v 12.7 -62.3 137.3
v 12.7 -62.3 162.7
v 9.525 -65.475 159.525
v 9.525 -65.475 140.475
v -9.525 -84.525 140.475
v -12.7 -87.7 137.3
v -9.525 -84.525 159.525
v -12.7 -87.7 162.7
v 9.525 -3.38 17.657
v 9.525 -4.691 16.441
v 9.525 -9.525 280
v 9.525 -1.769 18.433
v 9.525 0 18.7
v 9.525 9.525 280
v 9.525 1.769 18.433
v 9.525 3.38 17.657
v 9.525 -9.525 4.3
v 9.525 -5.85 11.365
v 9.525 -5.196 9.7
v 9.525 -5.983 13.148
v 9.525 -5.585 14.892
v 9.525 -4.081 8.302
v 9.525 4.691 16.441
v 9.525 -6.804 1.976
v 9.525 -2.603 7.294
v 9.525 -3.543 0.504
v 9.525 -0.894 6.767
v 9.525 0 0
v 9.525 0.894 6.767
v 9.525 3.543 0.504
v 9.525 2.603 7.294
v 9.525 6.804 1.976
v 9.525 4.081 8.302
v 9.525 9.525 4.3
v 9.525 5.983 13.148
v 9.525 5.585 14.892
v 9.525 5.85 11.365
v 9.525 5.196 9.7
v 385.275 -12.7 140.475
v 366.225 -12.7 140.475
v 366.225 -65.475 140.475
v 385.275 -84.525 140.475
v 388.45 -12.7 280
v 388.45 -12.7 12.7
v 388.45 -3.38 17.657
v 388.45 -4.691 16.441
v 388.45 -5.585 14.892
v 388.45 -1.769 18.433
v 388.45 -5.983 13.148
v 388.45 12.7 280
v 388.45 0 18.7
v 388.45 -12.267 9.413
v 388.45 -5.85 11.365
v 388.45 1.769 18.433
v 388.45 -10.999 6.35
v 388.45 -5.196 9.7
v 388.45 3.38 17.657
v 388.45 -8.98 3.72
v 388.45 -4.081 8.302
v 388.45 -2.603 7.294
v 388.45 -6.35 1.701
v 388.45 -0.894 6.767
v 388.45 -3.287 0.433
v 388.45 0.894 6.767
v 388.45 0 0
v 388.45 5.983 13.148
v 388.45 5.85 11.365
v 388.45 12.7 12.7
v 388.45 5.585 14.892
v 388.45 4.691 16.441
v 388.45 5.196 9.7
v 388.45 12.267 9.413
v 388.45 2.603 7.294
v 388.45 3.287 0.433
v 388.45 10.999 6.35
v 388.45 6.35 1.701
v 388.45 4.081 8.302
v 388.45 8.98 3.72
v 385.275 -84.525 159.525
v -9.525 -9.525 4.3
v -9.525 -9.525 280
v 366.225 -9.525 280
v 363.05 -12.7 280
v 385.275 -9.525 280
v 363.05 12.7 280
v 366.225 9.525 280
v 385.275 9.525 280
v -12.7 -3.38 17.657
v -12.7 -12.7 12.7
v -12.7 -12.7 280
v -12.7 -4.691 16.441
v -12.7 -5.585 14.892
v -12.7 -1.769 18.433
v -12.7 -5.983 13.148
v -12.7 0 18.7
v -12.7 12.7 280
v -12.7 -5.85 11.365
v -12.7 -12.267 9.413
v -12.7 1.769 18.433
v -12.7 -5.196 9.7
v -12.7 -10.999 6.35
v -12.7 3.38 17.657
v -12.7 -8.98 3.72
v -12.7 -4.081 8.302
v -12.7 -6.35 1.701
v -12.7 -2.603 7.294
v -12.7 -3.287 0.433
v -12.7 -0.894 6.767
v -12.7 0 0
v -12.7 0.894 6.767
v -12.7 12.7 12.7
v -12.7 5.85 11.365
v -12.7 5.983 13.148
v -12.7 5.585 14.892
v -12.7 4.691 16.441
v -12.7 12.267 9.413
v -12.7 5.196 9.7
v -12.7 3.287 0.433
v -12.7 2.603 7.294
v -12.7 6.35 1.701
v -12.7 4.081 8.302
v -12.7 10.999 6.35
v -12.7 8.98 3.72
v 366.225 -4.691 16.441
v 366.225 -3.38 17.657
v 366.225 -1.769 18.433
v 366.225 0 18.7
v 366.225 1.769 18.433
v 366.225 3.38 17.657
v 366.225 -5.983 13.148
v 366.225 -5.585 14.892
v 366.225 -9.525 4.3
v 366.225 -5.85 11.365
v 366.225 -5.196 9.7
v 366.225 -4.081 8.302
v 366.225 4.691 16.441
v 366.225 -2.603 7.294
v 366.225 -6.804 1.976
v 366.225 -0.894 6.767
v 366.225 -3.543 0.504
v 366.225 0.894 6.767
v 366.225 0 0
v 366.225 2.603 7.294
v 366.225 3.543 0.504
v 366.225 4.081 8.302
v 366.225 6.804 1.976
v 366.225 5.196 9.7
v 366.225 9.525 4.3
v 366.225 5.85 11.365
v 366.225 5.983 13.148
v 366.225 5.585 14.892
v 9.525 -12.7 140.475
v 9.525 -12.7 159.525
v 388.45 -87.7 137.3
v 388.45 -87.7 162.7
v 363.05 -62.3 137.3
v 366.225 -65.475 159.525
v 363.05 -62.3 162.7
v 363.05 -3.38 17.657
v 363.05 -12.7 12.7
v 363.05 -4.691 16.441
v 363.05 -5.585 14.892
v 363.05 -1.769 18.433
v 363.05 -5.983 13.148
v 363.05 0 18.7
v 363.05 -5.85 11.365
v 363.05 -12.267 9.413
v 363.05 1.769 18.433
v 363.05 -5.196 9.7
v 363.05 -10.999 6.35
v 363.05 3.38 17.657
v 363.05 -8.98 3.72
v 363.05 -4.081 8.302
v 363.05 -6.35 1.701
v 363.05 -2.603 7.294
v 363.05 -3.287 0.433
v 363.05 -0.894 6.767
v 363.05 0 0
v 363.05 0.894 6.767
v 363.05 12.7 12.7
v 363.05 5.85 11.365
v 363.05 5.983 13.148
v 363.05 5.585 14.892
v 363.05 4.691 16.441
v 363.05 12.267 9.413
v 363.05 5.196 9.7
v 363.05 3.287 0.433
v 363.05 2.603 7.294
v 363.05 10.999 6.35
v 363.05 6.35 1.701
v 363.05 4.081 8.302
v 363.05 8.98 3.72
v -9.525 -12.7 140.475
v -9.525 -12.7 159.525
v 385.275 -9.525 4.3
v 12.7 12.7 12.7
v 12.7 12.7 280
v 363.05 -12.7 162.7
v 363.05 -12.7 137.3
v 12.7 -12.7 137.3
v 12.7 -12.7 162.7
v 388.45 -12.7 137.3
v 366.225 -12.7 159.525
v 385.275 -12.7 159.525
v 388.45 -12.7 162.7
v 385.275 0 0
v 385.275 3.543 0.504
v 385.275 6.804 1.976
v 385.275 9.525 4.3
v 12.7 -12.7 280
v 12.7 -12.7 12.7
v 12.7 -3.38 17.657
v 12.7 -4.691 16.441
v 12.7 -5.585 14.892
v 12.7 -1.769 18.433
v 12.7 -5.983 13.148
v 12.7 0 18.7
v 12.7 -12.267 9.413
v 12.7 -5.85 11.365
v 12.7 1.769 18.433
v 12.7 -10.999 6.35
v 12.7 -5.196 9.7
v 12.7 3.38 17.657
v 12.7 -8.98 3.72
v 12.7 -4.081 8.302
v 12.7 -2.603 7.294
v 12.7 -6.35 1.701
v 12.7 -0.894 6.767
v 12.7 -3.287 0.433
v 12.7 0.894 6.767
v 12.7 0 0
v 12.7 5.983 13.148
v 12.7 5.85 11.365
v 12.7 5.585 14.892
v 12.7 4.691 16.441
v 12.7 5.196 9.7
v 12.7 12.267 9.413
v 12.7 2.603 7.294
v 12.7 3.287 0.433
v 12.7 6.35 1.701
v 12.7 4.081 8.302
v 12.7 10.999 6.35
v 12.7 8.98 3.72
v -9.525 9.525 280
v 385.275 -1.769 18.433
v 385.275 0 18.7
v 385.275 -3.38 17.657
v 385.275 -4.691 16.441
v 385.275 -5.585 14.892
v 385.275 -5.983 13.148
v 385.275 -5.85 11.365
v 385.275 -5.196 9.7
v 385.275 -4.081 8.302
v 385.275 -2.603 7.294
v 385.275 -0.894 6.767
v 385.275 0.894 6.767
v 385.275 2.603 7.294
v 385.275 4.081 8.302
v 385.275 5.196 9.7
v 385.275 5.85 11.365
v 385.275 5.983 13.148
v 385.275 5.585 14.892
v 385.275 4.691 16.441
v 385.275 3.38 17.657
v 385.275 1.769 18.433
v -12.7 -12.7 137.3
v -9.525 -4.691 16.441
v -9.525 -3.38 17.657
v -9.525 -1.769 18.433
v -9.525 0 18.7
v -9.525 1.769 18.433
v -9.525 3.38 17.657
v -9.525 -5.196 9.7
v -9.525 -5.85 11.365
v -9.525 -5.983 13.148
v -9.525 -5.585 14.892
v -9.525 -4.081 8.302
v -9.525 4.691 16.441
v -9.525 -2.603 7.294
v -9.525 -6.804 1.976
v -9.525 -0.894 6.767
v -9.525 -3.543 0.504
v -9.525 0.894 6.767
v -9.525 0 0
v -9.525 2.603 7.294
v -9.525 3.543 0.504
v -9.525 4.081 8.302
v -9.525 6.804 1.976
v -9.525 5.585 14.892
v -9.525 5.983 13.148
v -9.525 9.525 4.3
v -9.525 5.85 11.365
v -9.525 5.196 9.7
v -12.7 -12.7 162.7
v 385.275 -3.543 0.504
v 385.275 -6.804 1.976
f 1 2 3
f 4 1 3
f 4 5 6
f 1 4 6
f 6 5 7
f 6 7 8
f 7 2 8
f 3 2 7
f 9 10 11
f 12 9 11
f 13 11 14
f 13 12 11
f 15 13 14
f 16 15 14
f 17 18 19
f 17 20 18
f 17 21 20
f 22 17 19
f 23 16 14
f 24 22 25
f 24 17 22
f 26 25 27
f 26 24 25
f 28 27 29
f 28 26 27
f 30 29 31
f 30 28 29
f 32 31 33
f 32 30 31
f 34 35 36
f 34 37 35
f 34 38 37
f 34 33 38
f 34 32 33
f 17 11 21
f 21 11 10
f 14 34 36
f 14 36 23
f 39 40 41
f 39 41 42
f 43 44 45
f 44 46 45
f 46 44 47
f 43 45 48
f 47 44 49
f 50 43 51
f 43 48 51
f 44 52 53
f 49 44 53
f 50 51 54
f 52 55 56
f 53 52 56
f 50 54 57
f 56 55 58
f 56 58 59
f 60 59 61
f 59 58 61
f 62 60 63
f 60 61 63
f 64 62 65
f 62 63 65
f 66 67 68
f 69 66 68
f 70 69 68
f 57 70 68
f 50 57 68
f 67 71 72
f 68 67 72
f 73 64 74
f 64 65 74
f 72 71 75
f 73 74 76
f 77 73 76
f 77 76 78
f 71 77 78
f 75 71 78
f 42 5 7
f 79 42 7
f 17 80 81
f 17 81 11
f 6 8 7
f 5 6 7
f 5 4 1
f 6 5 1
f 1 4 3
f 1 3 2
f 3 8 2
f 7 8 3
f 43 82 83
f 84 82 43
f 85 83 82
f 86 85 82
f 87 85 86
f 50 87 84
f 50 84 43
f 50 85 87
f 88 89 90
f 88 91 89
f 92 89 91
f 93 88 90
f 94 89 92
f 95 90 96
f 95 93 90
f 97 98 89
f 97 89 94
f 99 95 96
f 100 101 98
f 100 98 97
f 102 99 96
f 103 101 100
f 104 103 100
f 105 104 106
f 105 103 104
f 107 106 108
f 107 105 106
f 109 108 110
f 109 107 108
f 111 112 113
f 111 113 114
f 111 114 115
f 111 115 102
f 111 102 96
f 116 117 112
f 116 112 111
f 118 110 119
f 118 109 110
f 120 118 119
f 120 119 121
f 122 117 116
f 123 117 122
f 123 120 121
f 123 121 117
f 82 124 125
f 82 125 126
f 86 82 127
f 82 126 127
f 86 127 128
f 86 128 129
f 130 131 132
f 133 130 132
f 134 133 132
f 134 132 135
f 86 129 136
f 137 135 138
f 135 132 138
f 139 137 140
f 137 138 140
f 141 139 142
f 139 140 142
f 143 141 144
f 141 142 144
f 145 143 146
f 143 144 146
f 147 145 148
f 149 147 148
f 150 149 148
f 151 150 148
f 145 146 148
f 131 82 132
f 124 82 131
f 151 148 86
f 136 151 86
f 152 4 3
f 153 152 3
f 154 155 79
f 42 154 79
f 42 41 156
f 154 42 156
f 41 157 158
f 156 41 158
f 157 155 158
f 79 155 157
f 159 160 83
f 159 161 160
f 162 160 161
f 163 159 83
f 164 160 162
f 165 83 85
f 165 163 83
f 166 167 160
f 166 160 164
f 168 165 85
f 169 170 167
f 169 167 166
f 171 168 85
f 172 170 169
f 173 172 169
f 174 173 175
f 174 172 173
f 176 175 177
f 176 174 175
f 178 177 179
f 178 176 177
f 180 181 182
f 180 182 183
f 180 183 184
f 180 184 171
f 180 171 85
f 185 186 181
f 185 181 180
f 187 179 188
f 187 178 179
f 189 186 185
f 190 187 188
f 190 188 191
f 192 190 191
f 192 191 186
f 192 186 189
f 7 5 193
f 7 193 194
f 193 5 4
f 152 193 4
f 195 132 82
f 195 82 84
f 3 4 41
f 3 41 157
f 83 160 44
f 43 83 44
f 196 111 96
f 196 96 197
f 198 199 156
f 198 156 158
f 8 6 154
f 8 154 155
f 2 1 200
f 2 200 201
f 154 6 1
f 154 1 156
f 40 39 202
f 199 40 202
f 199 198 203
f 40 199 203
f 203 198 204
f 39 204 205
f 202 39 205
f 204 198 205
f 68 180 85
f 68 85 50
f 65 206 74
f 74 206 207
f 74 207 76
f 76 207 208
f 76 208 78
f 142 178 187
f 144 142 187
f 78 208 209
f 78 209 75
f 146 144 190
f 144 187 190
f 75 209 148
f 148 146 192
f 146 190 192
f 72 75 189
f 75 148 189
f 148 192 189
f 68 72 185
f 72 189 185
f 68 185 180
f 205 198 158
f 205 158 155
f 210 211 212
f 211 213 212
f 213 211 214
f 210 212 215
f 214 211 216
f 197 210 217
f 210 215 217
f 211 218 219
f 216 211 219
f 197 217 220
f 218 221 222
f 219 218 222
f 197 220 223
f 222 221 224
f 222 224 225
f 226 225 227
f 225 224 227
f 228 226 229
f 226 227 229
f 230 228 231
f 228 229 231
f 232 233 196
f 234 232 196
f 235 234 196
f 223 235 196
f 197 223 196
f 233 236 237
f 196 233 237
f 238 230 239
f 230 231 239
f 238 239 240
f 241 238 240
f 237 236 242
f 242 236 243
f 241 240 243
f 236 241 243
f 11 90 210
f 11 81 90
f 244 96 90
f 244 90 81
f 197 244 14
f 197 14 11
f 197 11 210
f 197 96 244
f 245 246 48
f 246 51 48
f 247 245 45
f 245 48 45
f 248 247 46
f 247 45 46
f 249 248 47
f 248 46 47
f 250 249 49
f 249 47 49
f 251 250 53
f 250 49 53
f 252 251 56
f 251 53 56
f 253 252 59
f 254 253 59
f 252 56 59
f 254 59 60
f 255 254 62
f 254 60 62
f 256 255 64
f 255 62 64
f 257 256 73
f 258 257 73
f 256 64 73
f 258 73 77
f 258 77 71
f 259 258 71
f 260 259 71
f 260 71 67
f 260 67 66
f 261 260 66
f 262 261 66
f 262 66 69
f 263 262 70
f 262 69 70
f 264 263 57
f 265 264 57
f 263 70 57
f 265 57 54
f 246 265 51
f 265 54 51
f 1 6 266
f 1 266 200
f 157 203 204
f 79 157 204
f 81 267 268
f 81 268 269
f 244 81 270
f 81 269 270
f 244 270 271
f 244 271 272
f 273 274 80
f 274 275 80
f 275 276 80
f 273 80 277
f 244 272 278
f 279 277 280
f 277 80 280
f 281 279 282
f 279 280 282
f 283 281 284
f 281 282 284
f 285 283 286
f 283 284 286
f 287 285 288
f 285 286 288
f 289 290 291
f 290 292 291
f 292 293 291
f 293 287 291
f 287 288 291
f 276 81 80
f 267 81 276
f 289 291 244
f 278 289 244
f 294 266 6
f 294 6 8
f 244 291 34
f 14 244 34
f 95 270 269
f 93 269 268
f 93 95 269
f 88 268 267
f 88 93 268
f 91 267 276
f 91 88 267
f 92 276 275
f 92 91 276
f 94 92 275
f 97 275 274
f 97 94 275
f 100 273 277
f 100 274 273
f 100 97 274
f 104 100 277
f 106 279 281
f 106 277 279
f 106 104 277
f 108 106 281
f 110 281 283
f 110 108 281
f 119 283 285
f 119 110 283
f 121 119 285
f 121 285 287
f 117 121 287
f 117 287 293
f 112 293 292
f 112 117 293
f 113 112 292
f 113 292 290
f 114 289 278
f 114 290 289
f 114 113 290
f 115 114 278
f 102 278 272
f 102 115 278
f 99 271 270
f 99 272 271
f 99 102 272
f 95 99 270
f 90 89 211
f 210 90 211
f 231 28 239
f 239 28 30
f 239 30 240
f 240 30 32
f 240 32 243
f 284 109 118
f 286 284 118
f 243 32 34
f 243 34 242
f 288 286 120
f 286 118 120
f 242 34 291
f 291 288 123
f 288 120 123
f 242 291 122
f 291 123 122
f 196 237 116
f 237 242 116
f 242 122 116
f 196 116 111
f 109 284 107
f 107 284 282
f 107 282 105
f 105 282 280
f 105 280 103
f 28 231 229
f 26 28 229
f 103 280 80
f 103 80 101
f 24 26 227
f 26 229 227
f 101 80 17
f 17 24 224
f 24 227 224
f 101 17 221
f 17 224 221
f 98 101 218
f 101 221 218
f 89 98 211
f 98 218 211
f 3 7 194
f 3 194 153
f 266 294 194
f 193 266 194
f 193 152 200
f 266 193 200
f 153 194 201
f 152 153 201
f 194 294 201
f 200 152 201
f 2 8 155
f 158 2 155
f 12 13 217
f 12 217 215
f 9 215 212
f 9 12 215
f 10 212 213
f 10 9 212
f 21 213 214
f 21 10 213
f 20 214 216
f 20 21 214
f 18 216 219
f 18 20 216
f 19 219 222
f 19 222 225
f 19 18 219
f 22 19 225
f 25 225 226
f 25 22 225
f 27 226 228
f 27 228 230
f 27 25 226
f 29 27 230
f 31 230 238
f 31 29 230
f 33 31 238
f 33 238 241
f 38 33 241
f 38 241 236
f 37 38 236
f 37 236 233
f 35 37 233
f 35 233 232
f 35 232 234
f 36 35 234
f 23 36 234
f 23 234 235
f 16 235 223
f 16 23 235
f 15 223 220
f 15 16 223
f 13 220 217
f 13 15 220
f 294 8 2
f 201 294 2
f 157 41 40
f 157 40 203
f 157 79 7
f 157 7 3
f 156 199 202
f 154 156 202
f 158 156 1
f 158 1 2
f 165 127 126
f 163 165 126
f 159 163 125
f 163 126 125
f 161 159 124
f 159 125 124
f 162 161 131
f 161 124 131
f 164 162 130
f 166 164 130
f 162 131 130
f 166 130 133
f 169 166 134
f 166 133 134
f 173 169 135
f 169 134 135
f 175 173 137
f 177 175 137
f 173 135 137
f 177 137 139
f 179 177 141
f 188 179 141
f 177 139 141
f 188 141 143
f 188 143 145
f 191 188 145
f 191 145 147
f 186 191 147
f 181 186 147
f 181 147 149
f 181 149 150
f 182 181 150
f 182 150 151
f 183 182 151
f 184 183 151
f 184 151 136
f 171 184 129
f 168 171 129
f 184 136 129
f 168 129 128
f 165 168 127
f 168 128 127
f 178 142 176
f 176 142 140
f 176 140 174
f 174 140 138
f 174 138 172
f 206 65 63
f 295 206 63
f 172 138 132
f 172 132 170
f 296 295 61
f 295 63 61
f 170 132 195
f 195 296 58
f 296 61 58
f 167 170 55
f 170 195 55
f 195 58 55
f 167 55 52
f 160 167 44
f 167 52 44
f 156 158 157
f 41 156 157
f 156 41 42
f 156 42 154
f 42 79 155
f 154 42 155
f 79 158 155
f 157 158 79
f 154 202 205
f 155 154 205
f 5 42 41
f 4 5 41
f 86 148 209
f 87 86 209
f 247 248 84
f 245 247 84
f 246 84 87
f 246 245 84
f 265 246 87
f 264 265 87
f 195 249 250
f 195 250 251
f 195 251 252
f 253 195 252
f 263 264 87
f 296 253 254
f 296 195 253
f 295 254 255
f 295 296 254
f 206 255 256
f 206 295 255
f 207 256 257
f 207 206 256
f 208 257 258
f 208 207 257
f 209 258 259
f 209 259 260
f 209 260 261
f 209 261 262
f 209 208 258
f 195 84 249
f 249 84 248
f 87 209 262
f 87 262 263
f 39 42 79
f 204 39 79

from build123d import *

# Parameters (mm, degrees)
SKETCH1_W                   = 25.4
SKETCH1_H                   = 25.4
SKETCH1_W_2                 = 19.05
SKETCH1_H_2                 = 19.05
KICKSTAND_WELDMENTS_DEPTH   = 280
SKETCH1_ON_SEGMENT_2_W      = 25.4
SKETCH1_ON_SEGMENT_2_H      = 25.4
SKETCH1_ON_SEGMENT_2_W_2    = 19.05
SKETCH1_ON_SEGMENT_2_H_2    = 19.05
KICKSTAND_WELDMENTS_2_DEPTH = 280
SKETCH1_ON_SEGMENT_3_W      = 25.4
SKETCH1_ON_SEGMENT_3_H      = 25.4
SKETCH1_ON_SEGMENT_3_W_2    = 19.05
SKETCH1_ON_SEGMENT_3_H_2    = 19.05
KICKSTAND_WELDMENTS_3_DEPTH = 94.960512242
SKETCH1_ON_SEGMENT_4_W      = 25.4
SKETCH1_ON_SEGMENT_4_H      = 25.4
SKETCH1_ON_SEGMENT_4_W_2    = 19.05
SKETCH1_ON_SEGMENT_4_H_2    = 19.05
KICKSTAND_WELDMENTS_4_DEPTH = 413.671024484
SKETCH1_ON_SEGMENT_5_W      = 25.4
SKETCH1_ON_SEGMENT_5_H      = 25.4
SKETCH1_ON_SEGMENT_5_W_2    = 19.05
SKETCH1_ON_SEGMENT_5_H_2    = 19.05
KICKSTAND_WELDMENTS_5_DEPTH = 94.960512242
FILLET1_R                   = 12.7
FILLET2_R                   = 12.7


with BuildPart() as part:
    # Sketch1 → Kickstand Weldments (new body)
    with BuildSketch(Plane.XY):
        Rectangle(SKETCH1_W, SKETCH1_H)
        Rectangle(SKETCH1_W_2, SKETCH1_H_2, mode=Mode.SUBTRACT)
    extrude(amount=KICKSTAND_WELDMENTS_DEPTH)

    # Sketch4 → Ø12.0 (12) Diameter Hole1 (revolve, cut)
    with BuildSketch(Plane(origin=(-12.7, 0, 12.7), x_dir=(0, 0, 1), z_dir=(0, 1, 0))):
        Polygon((0, 0), (0, 29.005163714), (6, 25.4), (6, 0), align=None)
    f_12_0_12_diameter_hole1 = revolve(axis=Axis((-19.05, 0, 12.7), (1, 0, 0)), mode=Mode.SUBTRACT)

    # Fillet1
    # the kernel refuses this fillet: 12.7 mm, written as the material it takes off along each edge
    with BuildSketch(Plane(origin=(-44.45, 12.7, 0), x_dir=(0, 0, 1), z_dir=(1, 0, 0))) as fillet1_piece_1:
        with BuildLine():
            CenterArc((FILLET1_R, FILLET1_R), FILLET1_R, 180, 90)
            Line((0, FILLET1_R), (0, 0))
            Line((0, 0), (FILLET1_R, 0))
        make_face()
    extrude(amount=88.9, mode=Mode.SUBTRACT)
    with BuildSketch(Plane(origin=(44.45, -12.7, 0), x_dir=(0, 1, 0), z_dir=(-1, 0, 0))) as fillet1_piece_2:
        with BuildLine():
            CenterArc((FILLET1_R, -FILLET1_R), FILLET1_R, 90, 90)
            Line((0, -FILLET1_R), (0, 0))
            Line((0, 0), (FILLET1_R, 0))
        make_face()
    extrude(amount=88.9, mode=Mode.SUBTRACT)


with BuildPart() as body_2:
    # Sketch1 on segment 2 (carried to segment 2) → Kickstand Weldments 2 (new body)
    with BuildSketch(Plane(origin=(375.75, 0, 0), x_dir=(1, 0, 0), z_dir=(0, 0, 1))):
        Rectangle(SKETCH1_ON_SEGMENT_2_W, SKETCH1_ON_SEGMENT_2_H)
        Rectangle(SKETCH1_ON_SEGMENT_2_W_2, SKETCH1_ON_SEGMENT_2_H_2, mode=Mode.SUBTRACT)
    extrude(amount=KICKSTAND_WELDMENTS_2_DEPTH)

    # Mirror2: Ø12.0 (12) Diameter Hole1 across plane
    add(f_12_0_12_diameter_hole1.mirror(Plane(origin=(187.875, 0, 0), x_dir=(0, 0, 1), z_dir=(1, 0, 0))), mode=Mode.SUBTRACT)

    # Fillet2
    # the kernel refuses this fillet: 12.7 mm, written as the material it takes off along each edge
    with BuildSketch(Plane(origin=(420.2, -12.7, 0), x_dir=(0, 1, 0), z_dir=(-1, 0, 0))) as fillet2_piece_1:
        with BuildLine():
            CenterArc((FILLET2_R, -FILLET2_R), FILLET2_R, 90, 90)
            Line((0, -FILLET2_R), (0, 0))
            Line((0, 0), (FILLET2_R, 0))
        make_face()
    extrude(amount=88.9, mode=Mode.SUBTRACT)
    with BuildSketch(Plane(origin=(331.3, 12.7, 0), x_dir=(0, 0, 1), z_dir=(1, 0, 0))) as fillet2_piece_2:
        with BuildLine():
            CenterArc((FILLET2_R, FILLET2_R), FILLET2_R, 180, 90)
            Line((0, FILLET2_R), (0, 0))
            Line((0, 0), (FILLET2_R, 0))
        make_face()
    extrude(amount=88.9, mode=Mode.SUBTRACT)


with BuildPart() as body_3:
    # Sketch1 on segment 3 (carried to segment 3) → Kickstand Weldments 3 (new body)
    with BuildSketch(Plane(origin=(375.75, 1, 150), x_dir=(1, 0, 0), z_dir=(0, -1, 0))):
        Rectangle(SKETCH1_ON_SEGMENT_3_W, SKETCH1_ON_SEGMENT_3_H)
        Rectangle(SKETCH1_ON_SEGMENT_3_W_2, SKETCH1_ON_SEGMENT_3_H_2, mode=Mode.SUBTRACT)
    extrude(amount=KICKSTAND_WELDMENTS_3_DEPTH)

    # Kickstand Weldments 3 mitre 1
    split(bisect_by=Plane(origin=(375.75, -75, 150), x_dir=(-0.707106781, 0.707106781, 0), z_dir=(0.707106781, 0.707106781, 0)), keep=Keep.TOP)

    # Kickstand Weldments 3 mitre 2
    split(bisect_by=Plane(origin=(375.75, -12.7, 150), x_dir=(1, 0, 0), z_dir=(0, -1, 0)), keep=Keep.TOP)


with BuildPart() as body_4:
    # Sketch1 on segment 4 (carried to segment 4) → Kickstand Weldments 4 (new body)
    with BuildSketch(Plane(origin=(394.710512242, -75, 150), x_dir=(0, 0, 1), z_dir=(-1, 0, 0))):
        Rectangle(SKETCH1_ON_SEGMENT_4_W, SKETCH1_ON_SEGMENT_4_H)
        Rectangle(SKETCH1_ON_SEGMENT_4_W_2, SKETCH1_ON_SEGMENT_4_H_2, mode=Mode.SUBTRACT)
    extrude(amount=KICKSTAND_WELDMENTS_4_DEPTH)

    # Kickstand Weldments 4 mitre 1
    split(bisect_by=Plane(origin=(375.75, -75, 150), x_dir=(0.707106781, -0.707106781, 0), z_dir=(-0.707106781, -0.707106781, 0)), keep=Keep.TOP)

    # Kickstand Weldments 4 mitre 2
    split(bisect_by=Plane(origin=(0, -75, 150), x_dir=(0.707106781, 0.707106781, 0), z_dir=(0.707106781, -0.707106781, 0)), keep=Keep.TOP)


with BuildPart() as body_5:
    # Sketch1 on segment 5 (carried to segment 5) → Kickstand Weldments 5 (new body)
    with BuildSketch(Plane(origin=(0, 1, 150), x_dir=(1, 0, 0), z_dir=(0, -1, 0))):
        Rectangle(SKETCH1_ON_SEGMENT_5_W, SKETCH1_ON_SEGMENT_5_H)
        Rectangle(SKETCH1_ON_SEGMENT_5_W_2, SKETCH1_ON_SEGMENT_5_H_2, mode=Mode.SUBTRACT)
    extrude(amount=KICKSTAND_WELDMENTS_5_DEPTH)

    # Kickstand Weldments 5 mitre 1
    split(bisect_by=Plane(origin=(0, -75, 150), x_dir=(-0.707106781, -0.707106781, 0), z_dir=(-0.707106781, 0.707106781, 0)), keep=Keep.TOP)

    # Kickstand Weldments 5 mitre 2
    split(bisect_by=Plane(origin=(0, -12.7, 150), x_dir=(1, 0, 0), z_dir=(0, -1, 0)), keep=Keep.TOP)


solid = Compound([part.part, body_2.part, body_3.part, body_4.part, body_5.part])
